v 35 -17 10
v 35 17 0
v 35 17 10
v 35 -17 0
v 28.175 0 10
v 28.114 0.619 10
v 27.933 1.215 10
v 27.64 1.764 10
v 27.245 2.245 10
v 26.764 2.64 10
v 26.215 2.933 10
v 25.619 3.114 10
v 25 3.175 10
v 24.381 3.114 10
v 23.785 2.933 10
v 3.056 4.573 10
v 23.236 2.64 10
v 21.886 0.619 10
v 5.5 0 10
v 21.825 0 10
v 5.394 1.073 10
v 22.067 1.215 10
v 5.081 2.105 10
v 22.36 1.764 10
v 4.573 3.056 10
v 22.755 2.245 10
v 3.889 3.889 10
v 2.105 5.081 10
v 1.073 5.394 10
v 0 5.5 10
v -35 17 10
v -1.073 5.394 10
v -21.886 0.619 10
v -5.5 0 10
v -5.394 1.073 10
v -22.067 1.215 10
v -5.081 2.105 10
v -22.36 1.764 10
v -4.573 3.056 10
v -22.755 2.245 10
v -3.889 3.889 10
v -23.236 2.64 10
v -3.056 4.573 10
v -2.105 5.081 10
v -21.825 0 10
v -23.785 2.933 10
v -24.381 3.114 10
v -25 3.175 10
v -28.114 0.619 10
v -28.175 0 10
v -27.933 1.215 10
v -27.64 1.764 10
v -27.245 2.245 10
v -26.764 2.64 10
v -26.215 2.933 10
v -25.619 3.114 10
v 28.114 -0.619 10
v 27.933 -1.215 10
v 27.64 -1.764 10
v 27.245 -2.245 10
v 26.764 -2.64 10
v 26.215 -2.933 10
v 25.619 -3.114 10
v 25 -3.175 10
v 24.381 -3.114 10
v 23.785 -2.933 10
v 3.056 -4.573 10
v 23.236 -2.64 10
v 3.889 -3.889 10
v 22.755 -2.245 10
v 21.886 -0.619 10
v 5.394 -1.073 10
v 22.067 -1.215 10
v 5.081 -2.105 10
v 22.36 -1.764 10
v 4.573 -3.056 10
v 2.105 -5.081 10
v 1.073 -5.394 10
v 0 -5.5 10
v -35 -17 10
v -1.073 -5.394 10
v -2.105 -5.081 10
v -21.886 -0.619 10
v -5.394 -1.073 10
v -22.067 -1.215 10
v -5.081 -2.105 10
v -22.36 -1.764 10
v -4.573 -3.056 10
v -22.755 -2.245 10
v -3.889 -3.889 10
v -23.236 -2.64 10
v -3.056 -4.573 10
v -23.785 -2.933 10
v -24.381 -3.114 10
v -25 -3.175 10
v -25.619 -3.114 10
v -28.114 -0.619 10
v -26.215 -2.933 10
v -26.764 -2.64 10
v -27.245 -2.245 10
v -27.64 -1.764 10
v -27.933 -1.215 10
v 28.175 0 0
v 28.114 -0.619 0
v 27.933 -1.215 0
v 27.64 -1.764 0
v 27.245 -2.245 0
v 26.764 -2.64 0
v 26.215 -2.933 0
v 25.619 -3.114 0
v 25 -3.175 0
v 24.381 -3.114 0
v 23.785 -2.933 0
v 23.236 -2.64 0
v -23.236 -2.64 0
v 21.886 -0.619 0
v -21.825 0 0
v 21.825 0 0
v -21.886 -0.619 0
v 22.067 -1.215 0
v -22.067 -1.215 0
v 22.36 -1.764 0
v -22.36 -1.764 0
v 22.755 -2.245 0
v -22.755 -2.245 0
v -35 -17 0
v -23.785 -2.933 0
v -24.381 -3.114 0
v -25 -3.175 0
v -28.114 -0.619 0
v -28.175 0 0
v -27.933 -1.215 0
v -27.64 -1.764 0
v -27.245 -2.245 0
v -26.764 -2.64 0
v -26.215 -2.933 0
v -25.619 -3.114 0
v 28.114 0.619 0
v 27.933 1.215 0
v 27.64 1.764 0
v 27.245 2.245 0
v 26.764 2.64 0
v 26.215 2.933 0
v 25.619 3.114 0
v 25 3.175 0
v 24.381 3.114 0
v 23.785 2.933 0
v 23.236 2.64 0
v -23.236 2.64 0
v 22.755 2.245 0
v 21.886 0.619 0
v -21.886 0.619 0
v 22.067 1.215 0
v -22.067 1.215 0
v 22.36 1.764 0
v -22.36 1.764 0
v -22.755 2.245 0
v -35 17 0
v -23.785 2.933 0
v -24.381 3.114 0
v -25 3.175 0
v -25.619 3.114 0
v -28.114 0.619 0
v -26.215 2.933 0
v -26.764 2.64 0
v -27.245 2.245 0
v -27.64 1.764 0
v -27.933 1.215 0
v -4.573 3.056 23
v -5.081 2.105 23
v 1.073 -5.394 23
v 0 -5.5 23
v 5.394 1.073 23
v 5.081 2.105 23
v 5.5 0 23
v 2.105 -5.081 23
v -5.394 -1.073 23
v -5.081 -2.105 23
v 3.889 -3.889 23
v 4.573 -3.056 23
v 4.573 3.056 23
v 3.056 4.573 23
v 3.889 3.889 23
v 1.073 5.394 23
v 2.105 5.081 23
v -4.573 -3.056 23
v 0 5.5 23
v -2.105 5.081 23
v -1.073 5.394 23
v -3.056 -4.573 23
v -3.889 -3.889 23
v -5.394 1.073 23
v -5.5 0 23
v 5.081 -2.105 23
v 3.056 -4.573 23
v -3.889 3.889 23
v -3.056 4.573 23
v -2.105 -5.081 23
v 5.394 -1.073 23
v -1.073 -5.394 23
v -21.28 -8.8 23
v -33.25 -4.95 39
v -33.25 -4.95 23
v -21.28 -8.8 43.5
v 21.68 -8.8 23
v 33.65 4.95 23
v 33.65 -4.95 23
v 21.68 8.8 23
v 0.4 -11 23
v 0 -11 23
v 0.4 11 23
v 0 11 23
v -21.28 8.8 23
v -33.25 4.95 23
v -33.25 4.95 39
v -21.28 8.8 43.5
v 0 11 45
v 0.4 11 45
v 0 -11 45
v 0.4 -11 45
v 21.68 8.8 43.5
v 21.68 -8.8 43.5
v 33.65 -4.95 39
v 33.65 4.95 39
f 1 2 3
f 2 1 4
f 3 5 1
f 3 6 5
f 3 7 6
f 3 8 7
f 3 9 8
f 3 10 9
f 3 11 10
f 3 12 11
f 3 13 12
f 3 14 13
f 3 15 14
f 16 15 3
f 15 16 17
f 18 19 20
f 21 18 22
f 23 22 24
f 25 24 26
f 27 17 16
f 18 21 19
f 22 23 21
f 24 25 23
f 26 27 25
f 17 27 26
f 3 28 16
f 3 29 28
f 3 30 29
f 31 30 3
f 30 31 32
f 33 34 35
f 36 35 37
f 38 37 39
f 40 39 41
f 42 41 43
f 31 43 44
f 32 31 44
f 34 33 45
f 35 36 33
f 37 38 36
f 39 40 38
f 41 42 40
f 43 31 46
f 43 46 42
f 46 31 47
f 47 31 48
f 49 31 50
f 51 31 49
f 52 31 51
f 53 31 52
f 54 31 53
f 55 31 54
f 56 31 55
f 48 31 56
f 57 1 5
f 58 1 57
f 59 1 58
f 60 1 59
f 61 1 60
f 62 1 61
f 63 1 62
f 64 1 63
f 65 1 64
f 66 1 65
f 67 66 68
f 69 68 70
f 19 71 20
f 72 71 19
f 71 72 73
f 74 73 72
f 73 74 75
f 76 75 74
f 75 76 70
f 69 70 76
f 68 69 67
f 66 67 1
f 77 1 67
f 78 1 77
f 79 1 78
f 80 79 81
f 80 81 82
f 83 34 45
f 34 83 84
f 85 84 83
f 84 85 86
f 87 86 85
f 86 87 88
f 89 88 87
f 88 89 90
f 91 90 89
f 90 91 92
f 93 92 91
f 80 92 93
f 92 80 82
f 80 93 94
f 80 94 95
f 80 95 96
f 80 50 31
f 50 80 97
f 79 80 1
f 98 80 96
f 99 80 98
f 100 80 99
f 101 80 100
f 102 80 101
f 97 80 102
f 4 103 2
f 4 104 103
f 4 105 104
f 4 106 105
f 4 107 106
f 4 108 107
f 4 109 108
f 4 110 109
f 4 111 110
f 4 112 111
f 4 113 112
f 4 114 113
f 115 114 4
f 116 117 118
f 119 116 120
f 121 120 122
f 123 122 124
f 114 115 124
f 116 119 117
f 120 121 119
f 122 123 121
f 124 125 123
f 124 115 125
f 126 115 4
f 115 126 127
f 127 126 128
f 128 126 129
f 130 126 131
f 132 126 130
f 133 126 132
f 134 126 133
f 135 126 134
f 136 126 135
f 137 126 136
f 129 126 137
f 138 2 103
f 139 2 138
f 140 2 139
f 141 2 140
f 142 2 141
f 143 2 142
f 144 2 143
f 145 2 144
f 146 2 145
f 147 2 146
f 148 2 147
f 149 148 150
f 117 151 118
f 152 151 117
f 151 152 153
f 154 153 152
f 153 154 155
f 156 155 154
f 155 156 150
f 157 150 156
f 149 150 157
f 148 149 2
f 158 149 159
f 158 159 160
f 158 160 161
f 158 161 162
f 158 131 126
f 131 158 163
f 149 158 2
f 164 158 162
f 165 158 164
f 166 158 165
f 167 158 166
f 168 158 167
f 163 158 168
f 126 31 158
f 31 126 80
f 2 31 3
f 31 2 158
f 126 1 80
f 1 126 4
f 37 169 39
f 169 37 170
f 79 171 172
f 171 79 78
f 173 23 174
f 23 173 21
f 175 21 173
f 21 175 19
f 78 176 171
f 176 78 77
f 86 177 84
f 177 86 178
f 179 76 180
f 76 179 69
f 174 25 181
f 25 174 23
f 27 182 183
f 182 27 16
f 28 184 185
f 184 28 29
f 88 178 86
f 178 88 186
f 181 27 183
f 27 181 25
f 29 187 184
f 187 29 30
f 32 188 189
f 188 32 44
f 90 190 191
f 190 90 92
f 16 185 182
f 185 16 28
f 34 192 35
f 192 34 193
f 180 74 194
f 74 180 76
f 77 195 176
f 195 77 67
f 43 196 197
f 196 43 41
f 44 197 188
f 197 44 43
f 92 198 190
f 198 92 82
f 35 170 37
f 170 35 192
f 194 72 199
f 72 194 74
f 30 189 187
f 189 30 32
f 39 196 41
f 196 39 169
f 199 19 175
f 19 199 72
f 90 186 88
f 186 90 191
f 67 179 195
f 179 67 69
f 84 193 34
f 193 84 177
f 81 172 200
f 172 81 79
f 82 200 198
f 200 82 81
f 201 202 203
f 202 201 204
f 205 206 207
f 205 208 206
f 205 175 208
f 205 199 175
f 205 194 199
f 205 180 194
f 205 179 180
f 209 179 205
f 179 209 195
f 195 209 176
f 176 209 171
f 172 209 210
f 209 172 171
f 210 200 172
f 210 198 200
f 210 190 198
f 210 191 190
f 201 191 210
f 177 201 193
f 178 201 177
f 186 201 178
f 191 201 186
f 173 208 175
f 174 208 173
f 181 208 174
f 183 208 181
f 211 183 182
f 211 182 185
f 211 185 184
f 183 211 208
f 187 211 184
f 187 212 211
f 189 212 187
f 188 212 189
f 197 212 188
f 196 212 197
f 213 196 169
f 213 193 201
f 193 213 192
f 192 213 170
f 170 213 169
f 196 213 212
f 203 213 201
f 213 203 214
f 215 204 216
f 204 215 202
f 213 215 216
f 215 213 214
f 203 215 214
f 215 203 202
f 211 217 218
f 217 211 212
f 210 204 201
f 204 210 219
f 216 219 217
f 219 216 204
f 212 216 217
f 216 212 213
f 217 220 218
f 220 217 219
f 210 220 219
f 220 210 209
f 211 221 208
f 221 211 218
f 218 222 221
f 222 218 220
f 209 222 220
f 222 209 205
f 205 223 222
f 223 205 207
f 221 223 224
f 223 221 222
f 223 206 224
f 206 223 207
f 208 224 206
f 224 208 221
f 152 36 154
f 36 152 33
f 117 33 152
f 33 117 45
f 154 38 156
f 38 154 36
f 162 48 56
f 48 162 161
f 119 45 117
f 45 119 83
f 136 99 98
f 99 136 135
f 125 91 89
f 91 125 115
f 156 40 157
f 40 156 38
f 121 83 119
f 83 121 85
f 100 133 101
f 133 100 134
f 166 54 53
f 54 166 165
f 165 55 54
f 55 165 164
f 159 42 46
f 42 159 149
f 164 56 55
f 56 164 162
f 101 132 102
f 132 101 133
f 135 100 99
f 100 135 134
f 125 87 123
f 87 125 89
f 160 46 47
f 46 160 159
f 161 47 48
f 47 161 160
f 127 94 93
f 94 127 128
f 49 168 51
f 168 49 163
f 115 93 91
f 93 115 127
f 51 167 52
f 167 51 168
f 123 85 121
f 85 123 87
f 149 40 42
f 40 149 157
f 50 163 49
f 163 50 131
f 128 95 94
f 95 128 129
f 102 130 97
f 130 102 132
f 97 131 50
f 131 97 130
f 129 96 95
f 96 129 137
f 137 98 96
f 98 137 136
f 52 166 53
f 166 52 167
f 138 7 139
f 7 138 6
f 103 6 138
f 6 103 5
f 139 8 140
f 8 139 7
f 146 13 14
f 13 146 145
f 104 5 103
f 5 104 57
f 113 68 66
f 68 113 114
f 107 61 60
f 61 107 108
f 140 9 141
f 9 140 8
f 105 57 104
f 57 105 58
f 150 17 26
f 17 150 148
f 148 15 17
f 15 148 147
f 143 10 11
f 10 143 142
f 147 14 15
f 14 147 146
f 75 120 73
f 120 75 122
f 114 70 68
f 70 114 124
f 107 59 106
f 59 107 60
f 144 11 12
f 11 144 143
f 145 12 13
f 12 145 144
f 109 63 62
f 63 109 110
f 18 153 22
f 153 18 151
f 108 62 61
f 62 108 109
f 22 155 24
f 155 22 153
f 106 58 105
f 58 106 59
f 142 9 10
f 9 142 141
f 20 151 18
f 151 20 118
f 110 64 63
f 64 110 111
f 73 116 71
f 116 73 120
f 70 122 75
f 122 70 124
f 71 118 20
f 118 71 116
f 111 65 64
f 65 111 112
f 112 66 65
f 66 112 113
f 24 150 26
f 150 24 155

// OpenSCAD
$fn = 32;

// ----------------------------------------------------------------------
// Boat cleat: 70 mm base, horn 34 mm up
// ----------------------------------------------------------------------

// --- parameters (mm) ---
base_l = 70;              // base length
base_w = 34;              // base width
base_t = 10;              // base thickness
horn_len = 66.5;          // horn length
horn_d = 22;              // horn diameter at the middle
horn_z = 34;              // horn axis height
end_drop = 6;             // how far the horn tips drop
post_d = 11;              // centre post diameter
holes_d = 6.35;           // fixing holes
hole_x = 25;              // fixing hole spacing

difference() {
  union() {
    translate([-35, -17, 0]) cube([base_l, base_w, base_t]);
    /* centre post, sunk 1 mm into the base */
    translate([0, 0, 9]) cylinder(h = 25, d = post_d);
    /* horn: a hull chain of boxes, full in the middle and lighter at the tips */
    hull() {
      translate([-33.25, -4.95, 23]) cube([0.4, 9.9, 16], center = false);
      translate([-21.28, -8.8, 23]) cube([0.4, 17.6, 20.5], center = false);
    }
    hull() {
      translate([-21.28, -8.8, 23]) cube([0.4, 17.6, 20.5], center = false);
      translate([0, -11, 23]) cube([0.4, 22, 22], center = false);
    }
    hull() {
      translate([0, -11, 23]) cube([0.4, 22, 22], center = false);
      translate([21.28, -8.8, 23]) cube([0.4, 17.6, 20.5], center = false);
    }
    hull() {
      translate([21.28, -8.8, 23]) cube([0.4, 17.6, 20.5], center = false);
      translate([33.25, -4.95, 23]) cube([0.4, 9.9, 16], center = false);
    }
  }
  translate([-25, 0, -2.5]) cylinder(h = base_t + 5, d = holes_d);
  translate([25, 0, -2.5]) cylinder(h = base_t + 5, d = holes_d);
}
